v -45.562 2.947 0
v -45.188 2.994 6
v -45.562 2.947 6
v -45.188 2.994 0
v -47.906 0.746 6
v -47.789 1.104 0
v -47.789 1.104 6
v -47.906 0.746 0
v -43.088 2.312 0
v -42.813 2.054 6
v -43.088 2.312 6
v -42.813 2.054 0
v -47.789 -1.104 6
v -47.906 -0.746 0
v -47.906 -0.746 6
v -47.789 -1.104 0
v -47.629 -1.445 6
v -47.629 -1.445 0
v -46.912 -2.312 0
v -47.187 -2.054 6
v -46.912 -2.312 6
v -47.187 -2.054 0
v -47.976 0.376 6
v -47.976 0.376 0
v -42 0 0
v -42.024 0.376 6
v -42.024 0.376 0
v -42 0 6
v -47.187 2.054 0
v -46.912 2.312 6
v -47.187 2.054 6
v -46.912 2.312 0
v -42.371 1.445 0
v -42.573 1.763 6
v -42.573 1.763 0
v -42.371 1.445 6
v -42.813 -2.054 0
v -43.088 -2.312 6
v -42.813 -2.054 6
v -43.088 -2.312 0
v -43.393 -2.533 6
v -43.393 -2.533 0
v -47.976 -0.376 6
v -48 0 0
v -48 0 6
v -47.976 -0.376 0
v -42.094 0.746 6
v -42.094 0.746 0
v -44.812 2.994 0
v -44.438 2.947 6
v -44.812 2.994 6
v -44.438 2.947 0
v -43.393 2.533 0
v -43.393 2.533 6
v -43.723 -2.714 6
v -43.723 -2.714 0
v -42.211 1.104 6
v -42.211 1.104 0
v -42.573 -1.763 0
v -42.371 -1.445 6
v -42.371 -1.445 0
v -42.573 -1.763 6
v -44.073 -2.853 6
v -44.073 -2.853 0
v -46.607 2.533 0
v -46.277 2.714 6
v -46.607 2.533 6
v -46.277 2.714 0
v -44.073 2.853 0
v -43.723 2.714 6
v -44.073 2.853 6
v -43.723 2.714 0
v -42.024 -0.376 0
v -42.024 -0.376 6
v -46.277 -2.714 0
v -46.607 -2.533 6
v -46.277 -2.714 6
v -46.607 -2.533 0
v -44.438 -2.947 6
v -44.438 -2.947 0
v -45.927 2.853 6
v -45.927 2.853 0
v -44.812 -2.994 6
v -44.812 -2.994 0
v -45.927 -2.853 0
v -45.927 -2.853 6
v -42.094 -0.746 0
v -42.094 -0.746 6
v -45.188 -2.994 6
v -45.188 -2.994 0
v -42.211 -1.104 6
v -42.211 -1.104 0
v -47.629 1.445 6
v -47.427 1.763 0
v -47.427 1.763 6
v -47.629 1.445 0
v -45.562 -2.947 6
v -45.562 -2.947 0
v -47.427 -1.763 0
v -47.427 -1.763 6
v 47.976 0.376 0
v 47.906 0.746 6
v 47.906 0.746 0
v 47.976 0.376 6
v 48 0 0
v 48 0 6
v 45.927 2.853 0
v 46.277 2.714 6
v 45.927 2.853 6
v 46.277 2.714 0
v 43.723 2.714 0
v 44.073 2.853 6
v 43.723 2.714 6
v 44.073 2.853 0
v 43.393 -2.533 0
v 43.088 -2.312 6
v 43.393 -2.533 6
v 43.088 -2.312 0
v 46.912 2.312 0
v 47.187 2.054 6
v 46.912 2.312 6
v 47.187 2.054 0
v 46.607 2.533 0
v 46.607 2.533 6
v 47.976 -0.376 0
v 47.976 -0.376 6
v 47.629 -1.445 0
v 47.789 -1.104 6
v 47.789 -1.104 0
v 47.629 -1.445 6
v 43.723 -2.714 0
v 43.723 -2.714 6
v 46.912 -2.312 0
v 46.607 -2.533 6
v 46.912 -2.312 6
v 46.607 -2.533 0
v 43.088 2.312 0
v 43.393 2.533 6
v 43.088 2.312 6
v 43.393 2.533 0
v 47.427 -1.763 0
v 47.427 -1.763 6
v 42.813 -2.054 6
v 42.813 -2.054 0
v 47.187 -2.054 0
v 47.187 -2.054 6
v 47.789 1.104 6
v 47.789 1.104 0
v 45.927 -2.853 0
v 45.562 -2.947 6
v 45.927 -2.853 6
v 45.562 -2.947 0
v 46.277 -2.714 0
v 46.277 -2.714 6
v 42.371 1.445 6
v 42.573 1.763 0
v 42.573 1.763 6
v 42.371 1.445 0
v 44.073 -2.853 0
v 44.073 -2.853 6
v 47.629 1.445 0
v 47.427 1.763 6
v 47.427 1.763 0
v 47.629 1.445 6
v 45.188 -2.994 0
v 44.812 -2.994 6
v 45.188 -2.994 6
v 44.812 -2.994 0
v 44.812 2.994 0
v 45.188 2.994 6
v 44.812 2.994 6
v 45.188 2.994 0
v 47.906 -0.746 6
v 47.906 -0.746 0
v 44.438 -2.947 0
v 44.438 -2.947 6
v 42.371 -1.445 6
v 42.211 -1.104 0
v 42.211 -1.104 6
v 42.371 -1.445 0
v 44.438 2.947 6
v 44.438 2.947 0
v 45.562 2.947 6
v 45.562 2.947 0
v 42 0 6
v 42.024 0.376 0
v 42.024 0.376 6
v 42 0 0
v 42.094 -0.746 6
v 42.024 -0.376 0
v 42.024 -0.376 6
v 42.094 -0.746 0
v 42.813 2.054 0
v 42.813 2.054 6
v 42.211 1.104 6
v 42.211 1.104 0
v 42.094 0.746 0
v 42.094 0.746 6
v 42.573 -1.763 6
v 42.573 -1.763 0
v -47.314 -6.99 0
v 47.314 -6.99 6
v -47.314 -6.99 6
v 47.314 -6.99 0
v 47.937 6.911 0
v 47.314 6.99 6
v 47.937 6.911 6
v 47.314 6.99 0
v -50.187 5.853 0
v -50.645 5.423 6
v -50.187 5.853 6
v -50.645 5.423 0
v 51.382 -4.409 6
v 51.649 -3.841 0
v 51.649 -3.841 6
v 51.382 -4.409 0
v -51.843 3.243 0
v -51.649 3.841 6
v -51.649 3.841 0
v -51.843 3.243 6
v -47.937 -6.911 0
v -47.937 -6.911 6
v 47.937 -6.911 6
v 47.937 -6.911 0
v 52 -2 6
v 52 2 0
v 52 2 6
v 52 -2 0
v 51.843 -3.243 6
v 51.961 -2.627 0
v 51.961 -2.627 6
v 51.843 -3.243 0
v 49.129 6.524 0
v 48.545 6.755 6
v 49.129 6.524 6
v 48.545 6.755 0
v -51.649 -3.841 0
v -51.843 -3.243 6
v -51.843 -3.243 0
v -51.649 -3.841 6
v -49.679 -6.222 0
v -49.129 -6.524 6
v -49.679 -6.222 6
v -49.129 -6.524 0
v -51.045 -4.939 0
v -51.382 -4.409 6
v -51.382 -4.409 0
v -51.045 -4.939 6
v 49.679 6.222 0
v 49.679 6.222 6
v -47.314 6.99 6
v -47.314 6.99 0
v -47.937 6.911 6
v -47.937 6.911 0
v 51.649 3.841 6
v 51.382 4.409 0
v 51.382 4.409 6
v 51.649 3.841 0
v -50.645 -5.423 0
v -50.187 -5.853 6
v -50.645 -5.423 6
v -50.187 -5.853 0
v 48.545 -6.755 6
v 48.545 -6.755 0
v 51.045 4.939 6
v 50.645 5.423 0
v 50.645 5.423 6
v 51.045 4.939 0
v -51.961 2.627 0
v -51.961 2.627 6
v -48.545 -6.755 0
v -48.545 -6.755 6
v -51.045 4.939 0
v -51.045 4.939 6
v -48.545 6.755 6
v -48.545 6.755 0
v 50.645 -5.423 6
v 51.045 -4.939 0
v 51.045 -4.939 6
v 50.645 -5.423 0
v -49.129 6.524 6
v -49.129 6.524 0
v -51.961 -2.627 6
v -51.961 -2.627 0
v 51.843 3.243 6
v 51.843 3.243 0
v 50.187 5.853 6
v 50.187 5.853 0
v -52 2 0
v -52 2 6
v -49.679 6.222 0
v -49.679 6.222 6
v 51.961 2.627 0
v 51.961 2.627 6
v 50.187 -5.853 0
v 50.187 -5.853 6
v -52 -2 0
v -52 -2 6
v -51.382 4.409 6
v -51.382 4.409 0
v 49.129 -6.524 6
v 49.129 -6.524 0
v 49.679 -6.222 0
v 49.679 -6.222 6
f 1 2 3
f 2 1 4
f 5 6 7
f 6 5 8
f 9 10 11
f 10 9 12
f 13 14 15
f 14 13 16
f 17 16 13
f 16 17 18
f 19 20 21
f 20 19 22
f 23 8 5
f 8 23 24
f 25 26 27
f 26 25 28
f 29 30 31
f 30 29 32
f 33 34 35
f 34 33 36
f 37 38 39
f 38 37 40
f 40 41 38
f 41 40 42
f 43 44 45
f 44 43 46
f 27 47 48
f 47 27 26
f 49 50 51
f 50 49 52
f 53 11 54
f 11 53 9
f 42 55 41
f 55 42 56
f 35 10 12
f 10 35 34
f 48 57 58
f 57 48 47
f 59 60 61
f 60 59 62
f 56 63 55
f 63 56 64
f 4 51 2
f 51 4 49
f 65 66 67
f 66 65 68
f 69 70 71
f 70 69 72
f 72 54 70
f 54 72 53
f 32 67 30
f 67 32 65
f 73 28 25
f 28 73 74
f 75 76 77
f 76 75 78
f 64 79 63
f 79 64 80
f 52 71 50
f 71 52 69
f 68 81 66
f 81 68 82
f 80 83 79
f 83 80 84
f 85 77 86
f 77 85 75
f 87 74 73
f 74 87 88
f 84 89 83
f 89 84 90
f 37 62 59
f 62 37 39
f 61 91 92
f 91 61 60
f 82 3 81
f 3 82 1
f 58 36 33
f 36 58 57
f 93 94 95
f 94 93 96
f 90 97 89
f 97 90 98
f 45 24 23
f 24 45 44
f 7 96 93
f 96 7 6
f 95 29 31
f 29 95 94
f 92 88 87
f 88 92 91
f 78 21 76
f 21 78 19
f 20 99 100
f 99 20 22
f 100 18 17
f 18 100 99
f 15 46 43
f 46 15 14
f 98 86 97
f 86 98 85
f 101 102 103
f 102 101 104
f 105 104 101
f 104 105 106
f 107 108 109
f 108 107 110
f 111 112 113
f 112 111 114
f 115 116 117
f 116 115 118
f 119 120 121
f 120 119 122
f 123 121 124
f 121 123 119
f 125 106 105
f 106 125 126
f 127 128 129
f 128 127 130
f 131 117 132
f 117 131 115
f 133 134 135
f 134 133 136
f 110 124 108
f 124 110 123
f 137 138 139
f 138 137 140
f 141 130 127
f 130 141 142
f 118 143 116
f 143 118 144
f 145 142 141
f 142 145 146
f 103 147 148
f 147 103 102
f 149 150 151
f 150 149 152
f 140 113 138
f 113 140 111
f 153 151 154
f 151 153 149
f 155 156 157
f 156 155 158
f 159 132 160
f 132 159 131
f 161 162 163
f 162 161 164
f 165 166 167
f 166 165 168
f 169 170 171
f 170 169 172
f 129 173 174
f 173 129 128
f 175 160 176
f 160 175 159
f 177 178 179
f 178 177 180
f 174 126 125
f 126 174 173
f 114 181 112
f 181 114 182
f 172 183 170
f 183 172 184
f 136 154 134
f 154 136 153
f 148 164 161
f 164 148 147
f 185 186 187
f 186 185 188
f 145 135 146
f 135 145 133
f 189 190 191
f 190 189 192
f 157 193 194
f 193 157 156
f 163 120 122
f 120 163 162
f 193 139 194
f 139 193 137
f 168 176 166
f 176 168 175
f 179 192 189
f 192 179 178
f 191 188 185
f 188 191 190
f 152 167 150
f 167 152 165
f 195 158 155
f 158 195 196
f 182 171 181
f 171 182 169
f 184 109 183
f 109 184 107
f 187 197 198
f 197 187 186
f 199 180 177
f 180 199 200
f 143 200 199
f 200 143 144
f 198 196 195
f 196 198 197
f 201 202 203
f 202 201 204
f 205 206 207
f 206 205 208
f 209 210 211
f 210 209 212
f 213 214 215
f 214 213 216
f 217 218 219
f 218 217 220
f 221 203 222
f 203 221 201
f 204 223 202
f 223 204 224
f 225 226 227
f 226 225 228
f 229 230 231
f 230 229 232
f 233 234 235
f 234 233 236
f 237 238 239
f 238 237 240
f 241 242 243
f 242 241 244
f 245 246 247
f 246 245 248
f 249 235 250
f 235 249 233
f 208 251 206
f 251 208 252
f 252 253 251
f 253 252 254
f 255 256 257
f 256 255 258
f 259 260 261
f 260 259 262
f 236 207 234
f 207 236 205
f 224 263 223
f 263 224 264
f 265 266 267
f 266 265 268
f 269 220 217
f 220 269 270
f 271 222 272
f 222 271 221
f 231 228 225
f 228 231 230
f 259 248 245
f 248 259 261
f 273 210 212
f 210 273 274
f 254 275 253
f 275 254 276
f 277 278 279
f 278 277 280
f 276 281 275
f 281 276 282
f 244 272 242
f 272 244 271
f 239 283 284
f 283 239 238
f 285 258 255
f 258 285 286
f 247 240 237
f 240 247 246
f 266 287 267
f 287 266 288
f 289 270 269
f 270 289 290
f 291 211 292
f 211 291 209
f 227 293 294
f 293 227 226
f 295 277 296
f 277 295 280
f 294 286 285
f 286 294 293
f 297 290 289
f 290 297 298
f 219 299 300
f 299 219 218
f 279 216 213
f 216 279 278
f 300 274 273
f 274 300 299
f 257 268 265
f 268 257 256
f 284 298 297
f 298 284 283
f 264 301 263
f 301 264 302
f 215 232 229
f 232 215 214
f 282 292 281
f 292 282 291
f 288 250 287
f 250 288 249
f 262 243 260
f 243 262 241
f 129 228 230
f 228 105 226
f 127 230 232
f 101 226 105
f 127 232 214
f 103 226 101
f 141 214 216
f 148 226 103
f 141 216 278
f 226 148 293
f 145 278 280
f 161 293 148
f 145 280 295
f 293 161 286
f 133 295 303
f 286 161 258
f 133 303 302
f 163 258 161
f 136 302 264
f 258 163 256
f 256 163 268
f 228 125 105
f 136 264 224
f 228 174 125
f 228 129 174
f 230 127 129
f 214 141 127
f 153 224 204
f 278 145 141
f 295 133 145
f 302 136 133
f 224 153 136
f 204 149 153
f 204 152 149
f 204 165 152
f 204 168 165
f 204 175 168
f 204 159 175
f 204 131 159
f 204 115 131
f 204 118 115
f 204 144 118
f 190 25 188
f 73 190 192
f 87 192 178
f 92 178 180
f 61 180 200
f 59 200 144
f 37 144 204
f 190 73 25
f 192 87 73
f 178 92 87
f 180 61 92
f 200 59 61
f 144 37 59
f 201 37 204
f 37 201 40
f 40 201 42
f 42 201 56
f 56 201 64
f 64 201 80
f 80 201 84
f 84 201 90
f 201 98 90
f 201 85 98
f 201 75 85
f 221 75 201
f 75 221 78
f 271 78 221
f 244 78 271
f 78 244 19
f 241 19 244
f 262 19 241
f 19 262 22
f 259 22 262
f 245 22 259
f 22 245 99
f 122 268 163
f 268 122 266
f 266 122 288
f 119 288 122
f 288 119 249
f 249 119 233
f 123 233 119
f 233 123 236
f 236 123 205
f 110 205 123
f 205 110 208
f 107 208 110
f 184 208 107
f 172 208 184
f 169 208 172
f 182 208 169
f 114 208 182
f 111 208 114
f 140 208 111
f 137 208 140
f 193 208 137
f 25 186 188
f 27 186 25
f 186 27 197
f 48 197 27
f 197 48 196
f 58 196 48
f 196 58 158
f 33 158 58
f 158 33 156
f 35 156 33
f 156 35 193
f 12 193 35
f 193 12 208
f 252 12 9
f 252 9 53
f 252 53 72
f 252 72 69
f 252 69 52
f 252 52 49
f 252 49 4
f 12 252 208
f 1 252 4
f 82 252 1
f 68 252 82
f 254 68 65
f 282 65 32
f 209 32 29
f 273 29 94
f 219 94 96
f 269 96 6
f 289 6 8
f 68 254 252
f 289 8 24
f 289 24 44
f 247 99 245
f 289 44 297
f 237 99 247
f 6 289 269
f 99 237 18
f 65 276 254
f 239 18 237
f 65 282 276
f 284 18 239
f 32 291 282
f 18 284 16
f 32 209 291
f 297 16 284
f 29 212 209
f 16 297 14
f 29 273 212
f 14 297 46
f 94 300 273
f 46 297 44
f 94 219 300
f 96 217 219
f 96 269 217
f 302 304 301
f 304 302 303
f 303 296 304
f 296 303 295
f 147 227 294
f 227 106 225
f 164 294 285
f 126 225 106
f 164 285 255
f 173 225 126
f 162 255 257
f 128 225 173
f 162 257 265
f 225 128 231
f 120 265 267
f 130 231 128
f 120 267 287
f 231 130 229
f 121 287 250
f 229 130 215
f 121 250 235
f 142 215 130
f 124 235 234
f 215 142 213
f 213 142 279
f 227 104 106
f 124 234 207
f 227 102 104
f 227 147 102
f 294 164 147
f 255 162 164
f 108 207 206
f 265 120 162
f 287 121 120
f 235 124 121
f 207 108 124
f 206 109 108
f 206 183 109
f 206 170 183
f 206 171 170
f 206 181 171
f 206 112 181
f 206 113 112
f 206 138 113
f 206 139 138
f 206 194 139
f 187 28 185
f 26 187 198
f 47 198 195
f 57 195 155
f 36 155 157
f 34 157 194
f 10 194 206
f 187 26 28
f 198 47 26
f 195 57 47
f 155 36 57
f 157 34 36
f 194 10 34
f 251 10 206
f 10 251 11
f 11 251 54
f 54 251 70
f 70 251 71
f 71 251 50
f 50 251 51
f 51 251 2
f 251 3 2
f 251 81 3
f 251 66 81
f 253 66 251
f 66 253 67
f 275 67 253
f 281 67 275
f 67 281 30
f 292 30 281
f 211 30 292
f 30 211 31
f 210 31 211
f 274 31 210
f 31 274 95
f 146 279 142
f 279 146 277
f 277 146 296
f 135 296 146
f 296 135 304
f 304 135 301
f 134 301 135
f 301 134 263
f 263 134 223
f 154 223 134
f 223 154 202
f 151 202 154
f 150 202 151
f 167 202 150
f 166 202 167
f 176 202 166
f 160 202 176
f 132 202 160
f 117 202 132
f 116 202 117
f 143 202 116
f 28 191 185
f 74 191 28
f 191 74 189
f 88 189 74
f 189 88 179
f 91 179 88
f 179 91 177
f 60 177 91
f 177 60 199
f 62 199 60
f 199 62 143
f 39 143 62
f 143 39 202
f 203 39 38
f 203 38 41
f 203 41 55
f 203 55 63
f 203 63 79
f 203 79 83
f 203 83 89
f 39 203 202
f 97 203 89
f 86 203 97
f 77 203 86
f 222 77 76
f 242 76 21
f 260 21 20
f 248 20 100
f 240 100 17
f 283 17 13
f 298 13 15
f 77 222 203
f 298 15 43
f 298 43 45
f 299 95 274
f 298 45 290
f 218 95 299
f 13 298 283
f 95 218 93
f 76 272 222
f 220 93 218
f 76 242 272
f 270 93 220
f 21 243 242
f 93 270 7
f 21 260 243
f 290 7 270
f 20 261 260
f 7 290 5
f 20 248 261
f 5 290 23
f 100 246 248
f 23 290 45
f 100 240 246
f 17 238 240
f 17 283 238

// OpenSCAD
$fn = 50;


difference() {
	union() {
		hull() {
			translate(v = [-47.0000000000, 2.0000000000, 0]) {
				cylinder(h = 6, r = 5);
			}
			translate(v = [47.0000000000, 2.0000000000, 0]) {
				cylinder(h = 6, r = 5);
			}
			translate(v = [-47.0000000000, -2.0000000000, 0]) {
				cylinder(h = 6, r = 5);
			}
			translate(v = [47.0000000000, -2.0000000000, 0]) {
				cylinder(h = 6, r = 5);
			}
		}
	}
	union() {
		translate(v = [-45.0000000000, 0.0000000000, -100.0000000000]) {
			cylinder(h = 200, r = 3.0000000000);
		}
		translate(v = [-45.0000000000, 0.0000000000, -100.0000000000]) {
			cylinder(h = 200, r = 3.0000000000);
		}
		translate(v = [45.0000000000, 0.0000000000, -100.0000000000]) {
			cylinder(h = 200, r = 3.0000000000);
		}
		translate(v = [45.0000000000, 0.0000000000, -100.0000000000]) {
			cylinder(h = 200, r = 3.0000000000);
		}
	}
}
